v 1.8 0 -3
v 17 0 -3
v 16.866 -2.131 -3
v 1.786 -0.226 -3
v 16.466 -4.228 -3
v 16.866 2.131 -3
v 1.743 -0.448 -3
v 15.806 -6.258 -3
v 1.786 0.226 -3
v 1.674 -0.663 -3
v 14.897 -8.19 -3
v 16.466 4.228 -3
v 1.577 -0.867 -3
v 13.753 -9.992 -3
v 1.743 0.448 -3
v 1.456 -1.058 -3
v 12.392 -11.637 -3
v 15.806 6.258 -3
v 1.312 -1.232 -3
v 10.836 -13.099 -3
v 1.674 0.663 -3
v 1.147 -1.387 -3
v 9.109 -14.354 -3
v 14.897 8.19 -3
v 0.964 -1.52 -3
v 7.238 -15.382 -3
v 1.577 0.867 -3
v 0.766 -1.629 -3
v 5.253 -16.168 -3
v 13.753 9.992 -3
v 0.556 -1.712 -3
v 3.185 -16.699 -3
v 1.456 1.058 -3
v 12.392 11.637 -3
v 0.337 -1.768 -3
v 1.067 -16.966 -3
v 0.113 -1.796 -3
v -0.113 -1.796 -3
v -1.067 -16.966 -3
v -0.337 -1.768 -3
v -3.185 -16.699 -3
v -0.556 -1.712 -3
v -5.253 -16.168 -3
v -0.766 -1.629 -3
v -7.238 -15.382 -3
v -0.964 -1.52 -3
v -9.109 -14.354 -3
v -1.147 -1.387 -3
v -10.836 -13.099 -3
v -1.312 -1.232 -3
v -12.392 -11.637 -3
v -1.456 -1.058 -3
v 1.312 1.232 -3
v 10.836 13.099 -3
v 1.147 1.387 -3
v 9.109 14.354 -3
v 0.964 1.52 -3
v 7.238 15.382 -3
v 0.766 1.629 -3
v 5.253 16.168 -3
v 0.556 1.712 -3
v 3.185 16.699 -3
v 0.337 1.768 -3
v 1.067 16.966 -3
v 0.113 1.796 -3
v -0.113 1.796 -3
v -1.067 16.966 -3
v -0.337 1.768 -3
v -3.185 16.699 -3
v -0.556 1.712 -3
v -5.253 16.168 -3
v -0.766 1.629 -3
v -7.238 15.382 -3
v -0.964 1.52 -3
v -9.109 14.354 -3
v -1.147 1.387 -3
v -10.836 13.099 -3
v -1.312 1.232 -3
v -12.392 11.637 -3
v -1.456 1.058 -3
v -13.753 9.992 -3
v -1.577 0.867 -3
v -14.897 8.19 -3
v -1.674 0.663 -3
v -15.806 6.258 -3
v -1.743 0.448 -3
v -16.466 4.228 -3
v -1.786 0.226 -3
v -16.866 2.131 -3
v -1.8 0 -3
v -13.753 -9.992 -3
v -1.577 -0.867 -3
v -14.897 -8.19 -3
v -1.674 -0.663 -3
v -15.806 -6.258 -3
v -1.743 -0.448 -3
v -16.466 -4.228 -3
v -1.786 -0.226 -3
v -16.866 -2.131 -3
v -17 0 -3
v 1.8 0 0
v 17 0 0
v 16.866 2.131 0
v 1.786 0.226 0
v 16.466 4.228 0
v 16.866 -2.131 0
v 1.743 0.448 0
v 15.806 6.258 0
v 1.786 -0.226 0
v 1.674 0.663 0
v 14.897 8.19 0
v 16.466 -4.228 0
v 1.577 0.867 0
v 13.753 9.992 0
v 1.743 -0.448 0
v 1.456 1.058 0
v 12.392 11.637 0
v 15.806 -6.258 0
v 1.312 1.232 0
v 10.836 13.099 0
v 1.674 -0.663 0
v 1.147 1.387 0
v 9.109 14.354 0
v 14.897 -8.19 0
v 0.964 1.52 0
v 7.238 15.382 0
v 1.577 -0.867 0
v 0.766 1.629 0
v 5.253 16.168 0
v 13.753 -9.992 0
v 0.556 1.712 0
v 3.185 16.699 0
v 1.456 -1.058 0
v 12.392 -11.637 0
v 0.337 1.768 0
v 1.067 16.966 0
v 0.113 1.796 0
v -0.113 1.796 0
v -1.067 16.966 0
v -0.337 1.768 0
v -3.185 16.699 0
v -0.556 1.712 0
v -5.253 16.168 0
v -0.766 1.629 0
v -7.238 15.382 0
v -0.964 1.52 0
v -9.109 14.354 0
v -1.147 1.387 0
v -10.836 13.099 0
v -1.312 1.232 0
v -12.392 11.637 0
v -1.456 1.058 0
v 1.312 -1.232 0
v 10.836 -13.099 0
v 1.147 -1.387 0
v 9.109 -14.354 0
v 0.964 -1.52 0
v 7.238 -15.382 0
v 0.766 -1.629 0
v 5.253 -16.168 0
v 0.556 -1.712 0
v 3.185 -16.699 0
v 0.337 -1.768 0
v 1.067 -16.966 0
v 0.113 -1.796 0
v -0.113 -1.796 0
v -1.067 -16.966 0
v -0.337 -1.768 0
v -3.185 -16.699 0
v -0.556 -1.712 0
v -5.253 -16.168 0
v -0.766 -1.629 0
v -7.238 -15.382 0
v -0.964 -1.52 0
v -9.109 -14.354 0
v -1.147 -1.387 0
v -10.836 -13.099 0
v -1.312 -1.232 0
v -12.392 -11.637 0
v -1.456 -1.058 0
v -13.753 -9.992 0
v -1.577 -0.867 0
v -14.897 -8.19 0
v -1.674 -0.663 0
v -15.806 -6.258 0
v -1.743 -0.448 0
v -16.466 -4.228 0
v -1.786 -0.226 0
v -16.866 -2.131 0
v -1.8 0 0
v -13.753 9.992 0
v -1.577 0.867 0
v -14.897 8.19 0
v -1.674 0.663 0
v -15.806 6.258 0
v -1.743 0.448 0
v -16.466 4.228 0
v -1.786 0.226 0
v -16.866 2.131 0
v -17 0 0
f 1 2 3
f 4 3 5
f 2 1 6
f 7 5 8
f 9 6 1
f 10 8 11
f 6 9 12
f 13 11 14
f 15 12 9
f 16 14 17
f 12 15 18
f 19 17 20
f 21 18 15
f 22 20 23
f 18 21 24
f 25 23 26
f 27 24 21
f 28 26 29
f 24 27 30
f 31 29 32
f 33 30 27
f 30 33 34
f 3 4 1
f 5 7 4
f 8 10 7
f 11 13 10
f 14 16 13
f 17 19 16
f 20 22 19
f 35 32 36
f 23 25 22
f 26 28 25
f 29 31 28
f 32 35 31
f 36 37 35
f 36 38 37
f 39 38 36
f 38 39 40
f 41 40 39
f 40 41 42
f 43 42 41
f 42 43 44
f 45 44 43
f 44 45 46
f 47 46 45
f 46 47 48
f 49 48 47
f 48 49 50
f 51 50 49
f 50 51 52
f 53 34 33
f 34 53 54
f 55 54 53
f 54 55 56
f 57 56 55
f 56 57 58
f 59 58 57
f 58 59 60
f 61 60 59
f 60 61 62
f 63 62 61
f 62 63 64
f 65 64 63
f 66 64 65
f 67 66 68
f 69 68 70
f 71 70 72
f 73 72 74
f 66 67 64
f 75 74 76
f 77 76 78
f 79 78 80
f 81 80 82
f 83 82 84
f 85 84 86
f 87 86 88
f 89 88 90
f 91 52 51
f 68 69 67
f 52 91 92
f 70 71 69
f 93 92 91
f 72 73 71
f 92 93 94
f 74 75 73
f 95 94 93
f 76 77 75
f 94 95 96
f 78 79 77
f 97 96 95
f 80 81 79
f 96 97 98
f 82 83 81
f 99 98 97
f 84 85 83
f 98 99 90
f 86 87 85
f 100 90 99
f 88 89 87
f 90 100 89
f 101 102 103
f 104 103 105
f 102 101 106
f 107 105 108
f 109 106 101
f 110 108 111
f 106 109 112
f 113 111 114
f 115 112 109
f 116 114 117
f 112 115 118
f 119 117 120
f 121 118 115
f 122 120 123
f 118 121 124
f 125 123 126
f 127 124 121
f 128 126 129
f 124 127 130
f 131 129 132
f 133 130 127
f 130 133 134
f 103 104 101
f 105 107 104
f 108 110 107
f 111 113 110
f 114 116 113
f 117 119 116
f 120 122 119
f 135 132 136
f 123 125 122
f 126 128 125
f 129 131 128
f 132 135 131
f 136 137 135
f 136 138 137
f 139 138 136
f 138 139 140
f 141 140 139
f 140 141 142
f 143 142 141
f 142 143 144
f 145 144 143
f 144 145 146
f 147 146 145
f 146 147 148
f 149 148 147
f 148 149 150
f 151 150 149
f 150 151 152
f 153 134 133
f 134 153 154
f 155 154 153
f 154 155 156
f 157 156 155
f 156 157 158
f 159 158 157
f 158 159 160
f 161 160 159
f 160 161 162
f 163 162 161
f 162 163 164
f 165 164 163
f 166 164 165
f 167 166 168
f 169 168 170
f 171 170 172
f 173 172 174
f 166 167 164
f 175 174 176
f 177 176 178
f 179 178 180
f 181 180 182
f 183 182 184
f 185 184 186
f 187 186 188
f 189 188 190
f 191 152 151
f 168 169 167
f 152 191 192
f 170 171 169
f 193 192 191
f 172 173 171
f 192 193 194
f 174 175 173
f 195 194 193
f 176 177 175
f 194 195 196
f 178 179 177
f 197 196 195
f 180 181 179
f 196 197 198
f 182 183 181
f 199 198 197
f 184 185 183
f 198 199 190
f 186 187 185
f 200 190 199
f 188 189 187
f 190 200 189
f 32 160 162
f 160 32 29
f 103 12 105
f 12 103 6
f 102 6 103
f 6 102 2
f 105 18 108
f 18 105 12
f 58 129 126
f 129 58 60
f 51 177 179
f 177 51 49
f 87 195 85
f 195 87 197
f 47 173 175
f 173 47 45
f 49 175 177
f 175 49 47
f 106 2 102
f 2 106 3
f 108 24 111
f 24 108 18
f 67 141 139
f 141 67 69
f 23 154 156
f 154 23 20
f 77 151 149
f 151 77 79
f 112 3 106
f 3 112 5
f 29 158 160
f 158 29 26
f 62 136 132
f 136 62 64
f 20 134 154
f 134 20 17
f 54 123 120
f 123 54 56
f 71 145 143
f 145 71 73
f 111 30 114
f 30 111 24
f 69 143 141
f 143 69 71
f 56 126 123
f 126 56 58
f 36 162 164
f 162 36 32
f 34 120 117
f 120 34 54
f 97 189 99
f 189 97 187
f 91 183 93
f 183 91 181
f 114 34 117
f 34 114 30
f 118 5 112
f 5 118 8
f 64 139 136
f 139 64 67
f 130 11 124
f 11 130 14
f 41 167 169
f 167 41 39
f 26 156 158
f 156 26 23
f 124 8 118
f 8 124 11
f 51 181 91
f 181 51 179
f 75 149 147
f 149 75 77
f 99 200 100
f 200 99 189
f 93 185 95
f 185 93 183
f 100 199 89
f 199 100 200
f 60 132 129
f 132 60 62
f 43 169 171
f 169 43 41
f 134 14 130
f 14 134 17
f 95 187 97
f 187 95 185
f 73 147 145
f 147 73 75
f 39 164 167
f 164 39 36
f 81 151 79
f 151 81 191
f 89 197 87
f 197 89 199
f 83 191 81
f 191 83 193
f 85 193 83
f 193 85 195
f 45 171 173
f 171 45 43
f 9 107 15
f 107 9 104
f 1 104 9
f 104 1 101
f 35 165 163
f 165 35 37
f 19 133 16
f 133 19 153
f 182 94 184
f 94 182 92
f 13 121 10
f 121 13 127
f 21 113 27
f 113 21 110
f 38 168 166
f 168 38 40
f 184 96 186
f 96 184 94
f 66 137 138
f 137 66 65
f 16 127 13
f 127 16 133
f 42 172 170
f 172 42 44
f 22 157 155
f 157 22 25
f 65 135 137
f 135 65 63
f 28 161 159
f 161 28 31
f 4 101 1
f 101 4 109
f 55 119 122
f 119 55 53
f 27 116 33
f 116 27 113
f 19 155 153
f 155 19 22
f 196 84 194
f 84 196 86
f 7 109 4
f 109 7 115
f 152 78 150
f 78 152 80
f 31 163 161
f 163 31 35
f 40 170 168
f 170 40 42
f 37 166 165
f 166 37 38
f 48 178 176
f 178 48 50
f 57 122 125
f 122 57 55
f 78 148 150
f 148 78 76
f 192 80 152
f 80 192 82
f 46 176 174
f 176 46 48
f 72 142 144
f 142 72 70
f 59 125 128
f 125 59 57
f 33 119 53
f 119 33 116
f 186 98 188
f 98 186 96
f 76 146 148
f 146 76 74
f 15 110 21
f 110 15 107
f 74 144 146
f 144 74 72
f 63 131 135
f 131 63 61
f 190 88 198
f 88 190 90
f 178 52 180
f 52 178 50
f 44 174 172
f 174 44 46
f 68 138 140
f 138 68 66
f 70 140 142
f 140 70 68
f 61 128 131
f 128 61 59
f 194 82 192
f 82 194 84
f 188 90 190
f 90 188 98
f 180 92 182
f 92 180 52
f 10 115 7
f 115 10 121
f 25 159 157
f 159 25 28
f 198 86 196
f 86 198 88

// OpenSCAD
$fn = 50;


difference() {
	union() {
		translate(v = [0, 0, -3.0000000000]) {
			cylinder(h = 3, r = 7.0000000000);
		}
		translate(v = [0, 0, -3.0000000000]) {
			cylinder(h = 3, r = 17.0000000000);
		}
	}
	union() {
		#translate(v = [0, 0, -3]) {
			cylinder(h = 3, r = 1.8000000000);
		}
	}
}
